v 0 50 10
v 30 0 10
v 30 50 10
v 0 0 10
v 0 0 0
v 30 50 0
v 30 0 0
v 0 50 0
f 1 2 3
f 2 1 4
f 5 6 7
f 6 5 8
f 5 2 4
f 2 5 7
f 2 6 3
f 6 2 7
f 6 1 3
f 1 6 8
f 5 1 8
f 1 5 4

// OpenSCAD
// test

/* [Settings] */

$fn = 200;
width = 30;
length = 50;

/* [Hidden] */

height = 10;

cube([width,length,height]);
